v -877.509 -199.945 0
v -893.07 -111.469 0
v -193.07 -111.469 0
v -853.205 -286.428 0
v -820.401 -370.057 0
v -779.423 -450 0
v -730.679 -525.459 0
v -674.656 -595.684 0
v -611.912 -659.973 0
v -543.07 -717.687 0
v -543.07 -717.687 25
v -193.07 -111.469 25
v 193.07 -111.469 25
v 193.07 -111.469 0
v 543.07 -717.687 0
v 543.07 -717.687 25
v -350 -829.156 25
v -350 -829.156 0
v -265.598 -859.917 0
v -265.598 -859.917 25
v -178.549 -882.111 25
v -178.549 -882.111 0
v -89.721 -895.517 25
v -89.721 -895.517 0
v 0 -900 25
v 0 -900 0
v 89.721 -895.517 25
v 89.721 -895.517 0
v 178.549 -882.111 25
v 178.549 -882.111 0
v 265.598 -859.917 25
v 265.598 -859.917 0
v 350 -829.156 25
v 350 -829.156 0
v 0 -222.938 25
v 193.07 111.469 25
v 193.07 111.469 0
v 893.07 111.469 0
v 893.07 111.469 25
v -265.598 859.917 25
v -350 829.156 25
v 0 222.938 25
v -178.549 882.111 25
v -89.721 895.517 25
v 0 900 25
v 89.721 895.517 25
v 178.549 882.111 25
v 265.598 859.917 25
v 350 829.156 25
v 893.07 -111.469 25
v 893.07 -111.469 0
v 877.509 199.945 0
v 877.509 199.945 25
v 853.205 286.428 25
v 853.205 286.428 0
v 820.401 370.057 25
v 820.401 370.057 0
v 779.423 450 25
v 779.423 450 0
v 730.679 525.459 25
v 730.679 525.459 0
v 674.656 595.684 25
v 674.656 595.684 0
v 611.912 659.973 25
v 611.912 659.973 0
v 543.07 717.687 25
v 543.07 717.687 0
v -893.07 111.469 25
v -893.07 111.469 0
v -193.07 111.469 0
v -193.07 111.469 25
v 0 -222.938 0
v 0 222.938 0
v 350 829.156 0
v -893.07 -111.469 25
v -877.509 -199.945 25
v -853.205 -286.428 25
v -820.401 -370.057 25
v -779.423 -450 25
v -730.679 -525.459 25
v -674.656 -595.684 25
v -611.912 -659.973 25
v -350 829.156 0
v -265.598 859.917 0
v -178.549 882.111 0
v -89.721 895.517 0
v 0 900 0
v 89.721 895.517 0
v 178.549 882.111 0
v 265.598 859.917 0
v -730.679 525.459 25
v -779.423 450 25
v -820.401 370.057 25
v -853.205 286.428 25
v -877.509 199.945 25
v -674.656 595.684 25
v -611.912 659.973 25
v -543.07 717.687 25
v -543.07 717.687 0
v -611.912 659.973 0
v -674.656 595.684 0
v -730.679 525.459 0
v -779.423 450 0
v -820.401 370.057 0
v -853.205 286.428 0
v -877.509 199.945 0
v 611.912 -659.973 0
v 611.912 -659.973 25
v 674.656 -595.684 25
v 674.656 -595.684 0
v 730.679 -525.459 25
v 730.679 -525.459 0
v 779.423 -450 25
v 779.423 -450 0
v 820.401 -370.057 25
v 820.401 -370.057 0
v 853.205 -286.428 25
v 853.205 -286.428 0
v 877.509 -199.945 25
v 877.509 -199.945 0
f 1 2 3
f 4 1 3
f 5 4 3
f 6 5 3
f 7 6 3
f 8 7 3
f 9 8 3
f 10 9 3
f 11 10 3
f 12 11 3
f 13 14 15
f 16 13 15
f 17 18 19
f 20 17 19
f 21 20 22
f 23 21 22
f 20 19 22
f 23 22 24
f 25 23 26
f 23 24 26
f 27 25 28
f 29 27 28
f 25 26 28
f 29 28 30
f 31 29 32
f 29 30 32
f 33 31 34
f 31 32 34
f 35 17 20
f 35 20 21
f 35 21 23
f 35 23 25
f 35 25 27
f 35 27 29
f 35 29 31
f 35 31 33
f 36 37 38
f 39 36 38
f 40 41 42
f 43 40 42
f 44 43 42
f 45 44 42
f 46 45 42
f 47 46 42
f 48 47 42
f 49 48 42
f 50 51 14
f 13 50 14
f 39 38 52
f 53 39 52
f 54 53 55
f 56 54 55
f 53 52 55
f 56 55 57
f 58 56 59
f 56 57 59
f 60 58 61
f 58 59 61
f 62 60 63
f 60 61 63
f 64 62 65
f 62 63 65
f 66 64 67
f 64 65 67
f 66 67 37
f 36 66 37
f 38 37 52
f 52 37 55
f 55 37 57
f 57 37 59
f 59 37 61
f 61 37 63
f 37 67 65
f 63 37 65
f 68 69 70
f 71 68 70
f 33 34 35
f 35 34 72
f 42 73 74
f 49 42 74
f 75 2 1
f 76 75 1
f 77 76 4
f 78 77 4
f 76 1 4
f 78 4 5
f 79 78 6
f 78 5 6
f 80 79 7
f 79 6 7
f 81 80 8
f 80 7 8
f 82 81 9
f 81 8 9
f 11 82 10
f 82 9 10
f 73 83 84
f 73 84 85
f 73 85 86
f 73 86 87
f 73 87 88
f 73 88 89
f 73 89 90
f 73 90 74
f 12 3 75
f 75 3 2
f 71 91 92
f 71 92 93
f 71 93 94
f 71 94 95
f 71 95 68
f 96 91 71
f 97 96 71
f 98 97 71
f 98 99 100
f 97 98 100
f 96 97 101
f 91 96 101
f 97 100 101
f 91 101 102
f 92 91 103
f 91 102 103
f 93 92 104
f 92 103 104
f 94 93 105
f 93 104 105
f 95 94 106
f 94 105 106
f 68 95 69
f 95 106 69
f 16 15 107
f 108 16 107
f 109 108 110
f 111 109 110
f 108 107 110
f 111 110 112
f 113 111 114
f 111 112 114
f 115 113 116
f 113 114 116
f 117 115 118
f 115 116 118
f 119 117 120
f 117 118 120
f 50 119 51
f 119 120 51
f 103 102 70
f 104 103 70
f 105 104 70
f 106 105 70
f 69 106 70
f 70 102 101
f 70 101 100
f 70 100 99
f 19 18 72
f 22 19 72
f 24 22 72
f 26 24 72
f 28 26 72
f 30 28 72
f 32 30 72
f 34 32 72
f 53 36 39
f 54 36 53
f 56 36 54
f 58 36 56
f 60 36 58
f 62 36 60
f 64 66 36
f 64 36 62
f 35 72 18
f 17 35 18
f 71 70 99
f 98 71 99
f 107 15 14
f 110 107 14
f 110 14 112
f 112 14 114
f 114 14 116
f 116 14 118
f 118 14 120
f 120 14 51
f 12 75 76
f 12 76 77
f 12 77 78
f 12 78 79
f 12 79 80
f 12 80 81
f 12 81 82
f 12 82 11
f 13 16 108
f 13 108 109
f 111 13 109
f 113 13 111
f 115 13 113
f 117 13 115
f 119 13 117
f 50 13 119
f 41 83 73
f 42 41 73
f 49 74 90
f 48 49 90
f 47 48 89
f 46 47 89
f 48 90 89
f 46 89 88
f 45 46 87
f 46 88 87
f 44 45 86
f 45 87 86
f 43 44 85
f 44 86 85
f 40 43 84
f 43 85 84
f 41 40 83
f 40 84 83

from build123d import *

# Parameters (mm, degrees)
F1_DEPTH = 25


with BuildPart() as f1:
    # F0 (on Top) → F1 (new body)
    with BuildSketch(Plane.XY):
        with BuildLine():
            Line((-193.0703308173, 111.4692074699), (-442.0690334252, 542.7476114056))
            ThreePointArc((-442.0690334252, 542.7476114056), (-606.2177826491, 350), (-691.0677360332, 111.4692074699))
            Line((-691.0677360332, 111.4692074699), (-193.0703308173, 111.4692074699))
        make_face()
        with BuildLine():
            ThreePointArc((-691.0677360332, 111.4692074699), (-606.2177826491, 350), (-442.0690334252, 542.7476114056))
            Line((-442.0690334252, 542.7476114056), (-543.0703308173, 717.686990119))
            ThreePointArc((-543.0703308172, 717.686990119), (-779.422863406, 450), (-893.0703308173, 111.4692074699))
            Line((-893.0703308173, 111.4692074699), (-691.0677360332, 111.4692074699))
        make_face()
    extrude(amount=F1_DEPTH)


with BuildPart() as f1b:
    # F0 (on Top) → F1, piece 2 (new body)
    with BuildSketch(Plane.XY):
        with BuildLine():
            Line((0, 222.9384149397), (248.998702608, 654.2168188755))
            ThreePointArc((248.998702608, 654.2168188755), (0, 700), (-248.998702608, 654.2168188755))
            Line((-248.998702608, 654.2168188755), (0, 222.9384149397))
        make_face()
        with BuildLine():
            ThreePointArc((-248.998702608, 654.2168188755), (0, 700), (248.998702608, 654.2168188755))
            Line((248.998702608, 654.2168188755), (350, 829.1561975888))
            ThreePointArc((350, 829.1561975889), (0, 900), (-350, 829.1561975888))
            Line((-350, 829.1561975888), (-248.998702608, 654.2168188755))
        make_face()
    extrude(amount=F1_DEPTH)


with BuildPart() as f1c:
    # F0 (on Top) → F1, piece 3 (new body)
    with BuildSketch(Plane.XY):
        with BuildLine():
            Line((193.0703308173, 111.4692074699), (691.0677360332, 111.4692074699))
            ThreePointArc((691.0677360332, 111.4692074699), (606.2177826491, 350), (442.0690334252, 542.7476114056))
            Line((442.0690334252, 542.7476114056), (193.0703308173, 111.4692074699))
        make_face()
        with BuildLine():
            ThreePointArc((442.0690334252, 542.7476114056), (606.2177826491, 350), (691.0677360332, 111.4692074699))
            Line((691.0677360332, 111.4692074699), (893.0703308173, 111.4692074699))
            ThreePointArc((893.0703308173, 111.4692074699), (779.422863406, 450), (543.0703308172, 717.686990119))
            Line((543.0703308173, 717.686990119), (442.0690334252, 542.7476114056))
        make_face()
    extrude(amount=F1_DEPTH)


with BuildPart() as f1d:
    # F0 (on Top) → F1, piece 4 (new body)
    with BuildSketch(Plane.XY):
        with BuildLine():
            ThreePointArc((442.0690334252, -542.7476114056), (606.2177826491, -350), (691.0677360332, -111.4692074699))
            Line((691.0677360332, -111.4692074699), (193.0703308173, -111.4692074699))
            Line((193.0703308173, -111.4692074699), (442.0690334252, -542.7476114056))
        make_face()
        with BuildLine():
            Line((893.0703308173, -111.4692074699), (691.0677360332, -111.4692074699))
            ThreePointArc((691.0677360332, -111.4692074699), (606.2177826491, -350), (442.0690334252, -542.7476114056))
            Line((442.0690334252, -542.7476114056), (543.0703308173, -717.686990119))
            ThreePointArc((543.0703308172, -717.686990119), (779.422863406, -450), (893.0703308173, -111.4692074699))
        make_face()
    extrude(amount=F1_DEPTH)


with BuildPart() as f1e:
    # F0 (on Top) → F1, piece 5 (new body)
    with BuildSketch(Plane.XY):
        with BuildLine():
            ThreePointArc((-248.998702608, -654.2168188755), (0, -700), (248.998702608, -654.2168188755))
            Line((248.998702608, -654.2168188755), (0, -222.9384149397))
            Line((0, -222.9384149397), (-248.998702608, -654.2168188755))
        make_face()
        with BuildLine():
            Line((350, -829.1561975888), (248.998702608, -654.2168188755))
            ThreePointArc((248.998702608, -654.2168188755), (0, -700), (-248.998702608, -654.2168188755))
            Line((-248.998702608, -654.2168188755), (-350, -829.1561975888))
            ThreePointArc((-350, -829.1561975889), (0, -900), (350, -829.1561975889))
        make_face()
    extrude(amount=F1_DEPTH)


with BuildPart() as f1f:
    # F0 (on Top) → F1, piece 6 (new body)
    with BuildSketch(Plane.XY):
        with BuildLine():
            Line((-543.0703308173, -717.686990119), (-442.0690334252, -542.7476114056))
            ThreePointArc((-442.0690334252, -542.7476114056), (-606.2177826491, -350), (-691.0677360332, -111.4692074699))
            Line((-691.0677360332, -111.4692074699), (-893.0703308172, -111.4692074699))
            ThreePointArc((-893.0703308173, -111.4692074699), (-779.422863406, -450), (-543.0703308172, -717.686990119))
        make_face()
        with BuildLine():
            ThreePointArc((-691.0677360332, -111.4692074699), (-606.2177826491, -350), (-442.0690334252, -542.7476114056))
            Line((-442.0690334252, -542.7476114056), (-193.0703308173, -111.4692074699))
            Line((-193.0703308173, -111.4692074699), (-691.0677360332, -111.4692074699))
        make_face()
    extrude(amount=F1_DEPTH)


solid = Compound([f1.part, f1b.part, f1c.part, f1d.part, f1e.part, f1f.part])
